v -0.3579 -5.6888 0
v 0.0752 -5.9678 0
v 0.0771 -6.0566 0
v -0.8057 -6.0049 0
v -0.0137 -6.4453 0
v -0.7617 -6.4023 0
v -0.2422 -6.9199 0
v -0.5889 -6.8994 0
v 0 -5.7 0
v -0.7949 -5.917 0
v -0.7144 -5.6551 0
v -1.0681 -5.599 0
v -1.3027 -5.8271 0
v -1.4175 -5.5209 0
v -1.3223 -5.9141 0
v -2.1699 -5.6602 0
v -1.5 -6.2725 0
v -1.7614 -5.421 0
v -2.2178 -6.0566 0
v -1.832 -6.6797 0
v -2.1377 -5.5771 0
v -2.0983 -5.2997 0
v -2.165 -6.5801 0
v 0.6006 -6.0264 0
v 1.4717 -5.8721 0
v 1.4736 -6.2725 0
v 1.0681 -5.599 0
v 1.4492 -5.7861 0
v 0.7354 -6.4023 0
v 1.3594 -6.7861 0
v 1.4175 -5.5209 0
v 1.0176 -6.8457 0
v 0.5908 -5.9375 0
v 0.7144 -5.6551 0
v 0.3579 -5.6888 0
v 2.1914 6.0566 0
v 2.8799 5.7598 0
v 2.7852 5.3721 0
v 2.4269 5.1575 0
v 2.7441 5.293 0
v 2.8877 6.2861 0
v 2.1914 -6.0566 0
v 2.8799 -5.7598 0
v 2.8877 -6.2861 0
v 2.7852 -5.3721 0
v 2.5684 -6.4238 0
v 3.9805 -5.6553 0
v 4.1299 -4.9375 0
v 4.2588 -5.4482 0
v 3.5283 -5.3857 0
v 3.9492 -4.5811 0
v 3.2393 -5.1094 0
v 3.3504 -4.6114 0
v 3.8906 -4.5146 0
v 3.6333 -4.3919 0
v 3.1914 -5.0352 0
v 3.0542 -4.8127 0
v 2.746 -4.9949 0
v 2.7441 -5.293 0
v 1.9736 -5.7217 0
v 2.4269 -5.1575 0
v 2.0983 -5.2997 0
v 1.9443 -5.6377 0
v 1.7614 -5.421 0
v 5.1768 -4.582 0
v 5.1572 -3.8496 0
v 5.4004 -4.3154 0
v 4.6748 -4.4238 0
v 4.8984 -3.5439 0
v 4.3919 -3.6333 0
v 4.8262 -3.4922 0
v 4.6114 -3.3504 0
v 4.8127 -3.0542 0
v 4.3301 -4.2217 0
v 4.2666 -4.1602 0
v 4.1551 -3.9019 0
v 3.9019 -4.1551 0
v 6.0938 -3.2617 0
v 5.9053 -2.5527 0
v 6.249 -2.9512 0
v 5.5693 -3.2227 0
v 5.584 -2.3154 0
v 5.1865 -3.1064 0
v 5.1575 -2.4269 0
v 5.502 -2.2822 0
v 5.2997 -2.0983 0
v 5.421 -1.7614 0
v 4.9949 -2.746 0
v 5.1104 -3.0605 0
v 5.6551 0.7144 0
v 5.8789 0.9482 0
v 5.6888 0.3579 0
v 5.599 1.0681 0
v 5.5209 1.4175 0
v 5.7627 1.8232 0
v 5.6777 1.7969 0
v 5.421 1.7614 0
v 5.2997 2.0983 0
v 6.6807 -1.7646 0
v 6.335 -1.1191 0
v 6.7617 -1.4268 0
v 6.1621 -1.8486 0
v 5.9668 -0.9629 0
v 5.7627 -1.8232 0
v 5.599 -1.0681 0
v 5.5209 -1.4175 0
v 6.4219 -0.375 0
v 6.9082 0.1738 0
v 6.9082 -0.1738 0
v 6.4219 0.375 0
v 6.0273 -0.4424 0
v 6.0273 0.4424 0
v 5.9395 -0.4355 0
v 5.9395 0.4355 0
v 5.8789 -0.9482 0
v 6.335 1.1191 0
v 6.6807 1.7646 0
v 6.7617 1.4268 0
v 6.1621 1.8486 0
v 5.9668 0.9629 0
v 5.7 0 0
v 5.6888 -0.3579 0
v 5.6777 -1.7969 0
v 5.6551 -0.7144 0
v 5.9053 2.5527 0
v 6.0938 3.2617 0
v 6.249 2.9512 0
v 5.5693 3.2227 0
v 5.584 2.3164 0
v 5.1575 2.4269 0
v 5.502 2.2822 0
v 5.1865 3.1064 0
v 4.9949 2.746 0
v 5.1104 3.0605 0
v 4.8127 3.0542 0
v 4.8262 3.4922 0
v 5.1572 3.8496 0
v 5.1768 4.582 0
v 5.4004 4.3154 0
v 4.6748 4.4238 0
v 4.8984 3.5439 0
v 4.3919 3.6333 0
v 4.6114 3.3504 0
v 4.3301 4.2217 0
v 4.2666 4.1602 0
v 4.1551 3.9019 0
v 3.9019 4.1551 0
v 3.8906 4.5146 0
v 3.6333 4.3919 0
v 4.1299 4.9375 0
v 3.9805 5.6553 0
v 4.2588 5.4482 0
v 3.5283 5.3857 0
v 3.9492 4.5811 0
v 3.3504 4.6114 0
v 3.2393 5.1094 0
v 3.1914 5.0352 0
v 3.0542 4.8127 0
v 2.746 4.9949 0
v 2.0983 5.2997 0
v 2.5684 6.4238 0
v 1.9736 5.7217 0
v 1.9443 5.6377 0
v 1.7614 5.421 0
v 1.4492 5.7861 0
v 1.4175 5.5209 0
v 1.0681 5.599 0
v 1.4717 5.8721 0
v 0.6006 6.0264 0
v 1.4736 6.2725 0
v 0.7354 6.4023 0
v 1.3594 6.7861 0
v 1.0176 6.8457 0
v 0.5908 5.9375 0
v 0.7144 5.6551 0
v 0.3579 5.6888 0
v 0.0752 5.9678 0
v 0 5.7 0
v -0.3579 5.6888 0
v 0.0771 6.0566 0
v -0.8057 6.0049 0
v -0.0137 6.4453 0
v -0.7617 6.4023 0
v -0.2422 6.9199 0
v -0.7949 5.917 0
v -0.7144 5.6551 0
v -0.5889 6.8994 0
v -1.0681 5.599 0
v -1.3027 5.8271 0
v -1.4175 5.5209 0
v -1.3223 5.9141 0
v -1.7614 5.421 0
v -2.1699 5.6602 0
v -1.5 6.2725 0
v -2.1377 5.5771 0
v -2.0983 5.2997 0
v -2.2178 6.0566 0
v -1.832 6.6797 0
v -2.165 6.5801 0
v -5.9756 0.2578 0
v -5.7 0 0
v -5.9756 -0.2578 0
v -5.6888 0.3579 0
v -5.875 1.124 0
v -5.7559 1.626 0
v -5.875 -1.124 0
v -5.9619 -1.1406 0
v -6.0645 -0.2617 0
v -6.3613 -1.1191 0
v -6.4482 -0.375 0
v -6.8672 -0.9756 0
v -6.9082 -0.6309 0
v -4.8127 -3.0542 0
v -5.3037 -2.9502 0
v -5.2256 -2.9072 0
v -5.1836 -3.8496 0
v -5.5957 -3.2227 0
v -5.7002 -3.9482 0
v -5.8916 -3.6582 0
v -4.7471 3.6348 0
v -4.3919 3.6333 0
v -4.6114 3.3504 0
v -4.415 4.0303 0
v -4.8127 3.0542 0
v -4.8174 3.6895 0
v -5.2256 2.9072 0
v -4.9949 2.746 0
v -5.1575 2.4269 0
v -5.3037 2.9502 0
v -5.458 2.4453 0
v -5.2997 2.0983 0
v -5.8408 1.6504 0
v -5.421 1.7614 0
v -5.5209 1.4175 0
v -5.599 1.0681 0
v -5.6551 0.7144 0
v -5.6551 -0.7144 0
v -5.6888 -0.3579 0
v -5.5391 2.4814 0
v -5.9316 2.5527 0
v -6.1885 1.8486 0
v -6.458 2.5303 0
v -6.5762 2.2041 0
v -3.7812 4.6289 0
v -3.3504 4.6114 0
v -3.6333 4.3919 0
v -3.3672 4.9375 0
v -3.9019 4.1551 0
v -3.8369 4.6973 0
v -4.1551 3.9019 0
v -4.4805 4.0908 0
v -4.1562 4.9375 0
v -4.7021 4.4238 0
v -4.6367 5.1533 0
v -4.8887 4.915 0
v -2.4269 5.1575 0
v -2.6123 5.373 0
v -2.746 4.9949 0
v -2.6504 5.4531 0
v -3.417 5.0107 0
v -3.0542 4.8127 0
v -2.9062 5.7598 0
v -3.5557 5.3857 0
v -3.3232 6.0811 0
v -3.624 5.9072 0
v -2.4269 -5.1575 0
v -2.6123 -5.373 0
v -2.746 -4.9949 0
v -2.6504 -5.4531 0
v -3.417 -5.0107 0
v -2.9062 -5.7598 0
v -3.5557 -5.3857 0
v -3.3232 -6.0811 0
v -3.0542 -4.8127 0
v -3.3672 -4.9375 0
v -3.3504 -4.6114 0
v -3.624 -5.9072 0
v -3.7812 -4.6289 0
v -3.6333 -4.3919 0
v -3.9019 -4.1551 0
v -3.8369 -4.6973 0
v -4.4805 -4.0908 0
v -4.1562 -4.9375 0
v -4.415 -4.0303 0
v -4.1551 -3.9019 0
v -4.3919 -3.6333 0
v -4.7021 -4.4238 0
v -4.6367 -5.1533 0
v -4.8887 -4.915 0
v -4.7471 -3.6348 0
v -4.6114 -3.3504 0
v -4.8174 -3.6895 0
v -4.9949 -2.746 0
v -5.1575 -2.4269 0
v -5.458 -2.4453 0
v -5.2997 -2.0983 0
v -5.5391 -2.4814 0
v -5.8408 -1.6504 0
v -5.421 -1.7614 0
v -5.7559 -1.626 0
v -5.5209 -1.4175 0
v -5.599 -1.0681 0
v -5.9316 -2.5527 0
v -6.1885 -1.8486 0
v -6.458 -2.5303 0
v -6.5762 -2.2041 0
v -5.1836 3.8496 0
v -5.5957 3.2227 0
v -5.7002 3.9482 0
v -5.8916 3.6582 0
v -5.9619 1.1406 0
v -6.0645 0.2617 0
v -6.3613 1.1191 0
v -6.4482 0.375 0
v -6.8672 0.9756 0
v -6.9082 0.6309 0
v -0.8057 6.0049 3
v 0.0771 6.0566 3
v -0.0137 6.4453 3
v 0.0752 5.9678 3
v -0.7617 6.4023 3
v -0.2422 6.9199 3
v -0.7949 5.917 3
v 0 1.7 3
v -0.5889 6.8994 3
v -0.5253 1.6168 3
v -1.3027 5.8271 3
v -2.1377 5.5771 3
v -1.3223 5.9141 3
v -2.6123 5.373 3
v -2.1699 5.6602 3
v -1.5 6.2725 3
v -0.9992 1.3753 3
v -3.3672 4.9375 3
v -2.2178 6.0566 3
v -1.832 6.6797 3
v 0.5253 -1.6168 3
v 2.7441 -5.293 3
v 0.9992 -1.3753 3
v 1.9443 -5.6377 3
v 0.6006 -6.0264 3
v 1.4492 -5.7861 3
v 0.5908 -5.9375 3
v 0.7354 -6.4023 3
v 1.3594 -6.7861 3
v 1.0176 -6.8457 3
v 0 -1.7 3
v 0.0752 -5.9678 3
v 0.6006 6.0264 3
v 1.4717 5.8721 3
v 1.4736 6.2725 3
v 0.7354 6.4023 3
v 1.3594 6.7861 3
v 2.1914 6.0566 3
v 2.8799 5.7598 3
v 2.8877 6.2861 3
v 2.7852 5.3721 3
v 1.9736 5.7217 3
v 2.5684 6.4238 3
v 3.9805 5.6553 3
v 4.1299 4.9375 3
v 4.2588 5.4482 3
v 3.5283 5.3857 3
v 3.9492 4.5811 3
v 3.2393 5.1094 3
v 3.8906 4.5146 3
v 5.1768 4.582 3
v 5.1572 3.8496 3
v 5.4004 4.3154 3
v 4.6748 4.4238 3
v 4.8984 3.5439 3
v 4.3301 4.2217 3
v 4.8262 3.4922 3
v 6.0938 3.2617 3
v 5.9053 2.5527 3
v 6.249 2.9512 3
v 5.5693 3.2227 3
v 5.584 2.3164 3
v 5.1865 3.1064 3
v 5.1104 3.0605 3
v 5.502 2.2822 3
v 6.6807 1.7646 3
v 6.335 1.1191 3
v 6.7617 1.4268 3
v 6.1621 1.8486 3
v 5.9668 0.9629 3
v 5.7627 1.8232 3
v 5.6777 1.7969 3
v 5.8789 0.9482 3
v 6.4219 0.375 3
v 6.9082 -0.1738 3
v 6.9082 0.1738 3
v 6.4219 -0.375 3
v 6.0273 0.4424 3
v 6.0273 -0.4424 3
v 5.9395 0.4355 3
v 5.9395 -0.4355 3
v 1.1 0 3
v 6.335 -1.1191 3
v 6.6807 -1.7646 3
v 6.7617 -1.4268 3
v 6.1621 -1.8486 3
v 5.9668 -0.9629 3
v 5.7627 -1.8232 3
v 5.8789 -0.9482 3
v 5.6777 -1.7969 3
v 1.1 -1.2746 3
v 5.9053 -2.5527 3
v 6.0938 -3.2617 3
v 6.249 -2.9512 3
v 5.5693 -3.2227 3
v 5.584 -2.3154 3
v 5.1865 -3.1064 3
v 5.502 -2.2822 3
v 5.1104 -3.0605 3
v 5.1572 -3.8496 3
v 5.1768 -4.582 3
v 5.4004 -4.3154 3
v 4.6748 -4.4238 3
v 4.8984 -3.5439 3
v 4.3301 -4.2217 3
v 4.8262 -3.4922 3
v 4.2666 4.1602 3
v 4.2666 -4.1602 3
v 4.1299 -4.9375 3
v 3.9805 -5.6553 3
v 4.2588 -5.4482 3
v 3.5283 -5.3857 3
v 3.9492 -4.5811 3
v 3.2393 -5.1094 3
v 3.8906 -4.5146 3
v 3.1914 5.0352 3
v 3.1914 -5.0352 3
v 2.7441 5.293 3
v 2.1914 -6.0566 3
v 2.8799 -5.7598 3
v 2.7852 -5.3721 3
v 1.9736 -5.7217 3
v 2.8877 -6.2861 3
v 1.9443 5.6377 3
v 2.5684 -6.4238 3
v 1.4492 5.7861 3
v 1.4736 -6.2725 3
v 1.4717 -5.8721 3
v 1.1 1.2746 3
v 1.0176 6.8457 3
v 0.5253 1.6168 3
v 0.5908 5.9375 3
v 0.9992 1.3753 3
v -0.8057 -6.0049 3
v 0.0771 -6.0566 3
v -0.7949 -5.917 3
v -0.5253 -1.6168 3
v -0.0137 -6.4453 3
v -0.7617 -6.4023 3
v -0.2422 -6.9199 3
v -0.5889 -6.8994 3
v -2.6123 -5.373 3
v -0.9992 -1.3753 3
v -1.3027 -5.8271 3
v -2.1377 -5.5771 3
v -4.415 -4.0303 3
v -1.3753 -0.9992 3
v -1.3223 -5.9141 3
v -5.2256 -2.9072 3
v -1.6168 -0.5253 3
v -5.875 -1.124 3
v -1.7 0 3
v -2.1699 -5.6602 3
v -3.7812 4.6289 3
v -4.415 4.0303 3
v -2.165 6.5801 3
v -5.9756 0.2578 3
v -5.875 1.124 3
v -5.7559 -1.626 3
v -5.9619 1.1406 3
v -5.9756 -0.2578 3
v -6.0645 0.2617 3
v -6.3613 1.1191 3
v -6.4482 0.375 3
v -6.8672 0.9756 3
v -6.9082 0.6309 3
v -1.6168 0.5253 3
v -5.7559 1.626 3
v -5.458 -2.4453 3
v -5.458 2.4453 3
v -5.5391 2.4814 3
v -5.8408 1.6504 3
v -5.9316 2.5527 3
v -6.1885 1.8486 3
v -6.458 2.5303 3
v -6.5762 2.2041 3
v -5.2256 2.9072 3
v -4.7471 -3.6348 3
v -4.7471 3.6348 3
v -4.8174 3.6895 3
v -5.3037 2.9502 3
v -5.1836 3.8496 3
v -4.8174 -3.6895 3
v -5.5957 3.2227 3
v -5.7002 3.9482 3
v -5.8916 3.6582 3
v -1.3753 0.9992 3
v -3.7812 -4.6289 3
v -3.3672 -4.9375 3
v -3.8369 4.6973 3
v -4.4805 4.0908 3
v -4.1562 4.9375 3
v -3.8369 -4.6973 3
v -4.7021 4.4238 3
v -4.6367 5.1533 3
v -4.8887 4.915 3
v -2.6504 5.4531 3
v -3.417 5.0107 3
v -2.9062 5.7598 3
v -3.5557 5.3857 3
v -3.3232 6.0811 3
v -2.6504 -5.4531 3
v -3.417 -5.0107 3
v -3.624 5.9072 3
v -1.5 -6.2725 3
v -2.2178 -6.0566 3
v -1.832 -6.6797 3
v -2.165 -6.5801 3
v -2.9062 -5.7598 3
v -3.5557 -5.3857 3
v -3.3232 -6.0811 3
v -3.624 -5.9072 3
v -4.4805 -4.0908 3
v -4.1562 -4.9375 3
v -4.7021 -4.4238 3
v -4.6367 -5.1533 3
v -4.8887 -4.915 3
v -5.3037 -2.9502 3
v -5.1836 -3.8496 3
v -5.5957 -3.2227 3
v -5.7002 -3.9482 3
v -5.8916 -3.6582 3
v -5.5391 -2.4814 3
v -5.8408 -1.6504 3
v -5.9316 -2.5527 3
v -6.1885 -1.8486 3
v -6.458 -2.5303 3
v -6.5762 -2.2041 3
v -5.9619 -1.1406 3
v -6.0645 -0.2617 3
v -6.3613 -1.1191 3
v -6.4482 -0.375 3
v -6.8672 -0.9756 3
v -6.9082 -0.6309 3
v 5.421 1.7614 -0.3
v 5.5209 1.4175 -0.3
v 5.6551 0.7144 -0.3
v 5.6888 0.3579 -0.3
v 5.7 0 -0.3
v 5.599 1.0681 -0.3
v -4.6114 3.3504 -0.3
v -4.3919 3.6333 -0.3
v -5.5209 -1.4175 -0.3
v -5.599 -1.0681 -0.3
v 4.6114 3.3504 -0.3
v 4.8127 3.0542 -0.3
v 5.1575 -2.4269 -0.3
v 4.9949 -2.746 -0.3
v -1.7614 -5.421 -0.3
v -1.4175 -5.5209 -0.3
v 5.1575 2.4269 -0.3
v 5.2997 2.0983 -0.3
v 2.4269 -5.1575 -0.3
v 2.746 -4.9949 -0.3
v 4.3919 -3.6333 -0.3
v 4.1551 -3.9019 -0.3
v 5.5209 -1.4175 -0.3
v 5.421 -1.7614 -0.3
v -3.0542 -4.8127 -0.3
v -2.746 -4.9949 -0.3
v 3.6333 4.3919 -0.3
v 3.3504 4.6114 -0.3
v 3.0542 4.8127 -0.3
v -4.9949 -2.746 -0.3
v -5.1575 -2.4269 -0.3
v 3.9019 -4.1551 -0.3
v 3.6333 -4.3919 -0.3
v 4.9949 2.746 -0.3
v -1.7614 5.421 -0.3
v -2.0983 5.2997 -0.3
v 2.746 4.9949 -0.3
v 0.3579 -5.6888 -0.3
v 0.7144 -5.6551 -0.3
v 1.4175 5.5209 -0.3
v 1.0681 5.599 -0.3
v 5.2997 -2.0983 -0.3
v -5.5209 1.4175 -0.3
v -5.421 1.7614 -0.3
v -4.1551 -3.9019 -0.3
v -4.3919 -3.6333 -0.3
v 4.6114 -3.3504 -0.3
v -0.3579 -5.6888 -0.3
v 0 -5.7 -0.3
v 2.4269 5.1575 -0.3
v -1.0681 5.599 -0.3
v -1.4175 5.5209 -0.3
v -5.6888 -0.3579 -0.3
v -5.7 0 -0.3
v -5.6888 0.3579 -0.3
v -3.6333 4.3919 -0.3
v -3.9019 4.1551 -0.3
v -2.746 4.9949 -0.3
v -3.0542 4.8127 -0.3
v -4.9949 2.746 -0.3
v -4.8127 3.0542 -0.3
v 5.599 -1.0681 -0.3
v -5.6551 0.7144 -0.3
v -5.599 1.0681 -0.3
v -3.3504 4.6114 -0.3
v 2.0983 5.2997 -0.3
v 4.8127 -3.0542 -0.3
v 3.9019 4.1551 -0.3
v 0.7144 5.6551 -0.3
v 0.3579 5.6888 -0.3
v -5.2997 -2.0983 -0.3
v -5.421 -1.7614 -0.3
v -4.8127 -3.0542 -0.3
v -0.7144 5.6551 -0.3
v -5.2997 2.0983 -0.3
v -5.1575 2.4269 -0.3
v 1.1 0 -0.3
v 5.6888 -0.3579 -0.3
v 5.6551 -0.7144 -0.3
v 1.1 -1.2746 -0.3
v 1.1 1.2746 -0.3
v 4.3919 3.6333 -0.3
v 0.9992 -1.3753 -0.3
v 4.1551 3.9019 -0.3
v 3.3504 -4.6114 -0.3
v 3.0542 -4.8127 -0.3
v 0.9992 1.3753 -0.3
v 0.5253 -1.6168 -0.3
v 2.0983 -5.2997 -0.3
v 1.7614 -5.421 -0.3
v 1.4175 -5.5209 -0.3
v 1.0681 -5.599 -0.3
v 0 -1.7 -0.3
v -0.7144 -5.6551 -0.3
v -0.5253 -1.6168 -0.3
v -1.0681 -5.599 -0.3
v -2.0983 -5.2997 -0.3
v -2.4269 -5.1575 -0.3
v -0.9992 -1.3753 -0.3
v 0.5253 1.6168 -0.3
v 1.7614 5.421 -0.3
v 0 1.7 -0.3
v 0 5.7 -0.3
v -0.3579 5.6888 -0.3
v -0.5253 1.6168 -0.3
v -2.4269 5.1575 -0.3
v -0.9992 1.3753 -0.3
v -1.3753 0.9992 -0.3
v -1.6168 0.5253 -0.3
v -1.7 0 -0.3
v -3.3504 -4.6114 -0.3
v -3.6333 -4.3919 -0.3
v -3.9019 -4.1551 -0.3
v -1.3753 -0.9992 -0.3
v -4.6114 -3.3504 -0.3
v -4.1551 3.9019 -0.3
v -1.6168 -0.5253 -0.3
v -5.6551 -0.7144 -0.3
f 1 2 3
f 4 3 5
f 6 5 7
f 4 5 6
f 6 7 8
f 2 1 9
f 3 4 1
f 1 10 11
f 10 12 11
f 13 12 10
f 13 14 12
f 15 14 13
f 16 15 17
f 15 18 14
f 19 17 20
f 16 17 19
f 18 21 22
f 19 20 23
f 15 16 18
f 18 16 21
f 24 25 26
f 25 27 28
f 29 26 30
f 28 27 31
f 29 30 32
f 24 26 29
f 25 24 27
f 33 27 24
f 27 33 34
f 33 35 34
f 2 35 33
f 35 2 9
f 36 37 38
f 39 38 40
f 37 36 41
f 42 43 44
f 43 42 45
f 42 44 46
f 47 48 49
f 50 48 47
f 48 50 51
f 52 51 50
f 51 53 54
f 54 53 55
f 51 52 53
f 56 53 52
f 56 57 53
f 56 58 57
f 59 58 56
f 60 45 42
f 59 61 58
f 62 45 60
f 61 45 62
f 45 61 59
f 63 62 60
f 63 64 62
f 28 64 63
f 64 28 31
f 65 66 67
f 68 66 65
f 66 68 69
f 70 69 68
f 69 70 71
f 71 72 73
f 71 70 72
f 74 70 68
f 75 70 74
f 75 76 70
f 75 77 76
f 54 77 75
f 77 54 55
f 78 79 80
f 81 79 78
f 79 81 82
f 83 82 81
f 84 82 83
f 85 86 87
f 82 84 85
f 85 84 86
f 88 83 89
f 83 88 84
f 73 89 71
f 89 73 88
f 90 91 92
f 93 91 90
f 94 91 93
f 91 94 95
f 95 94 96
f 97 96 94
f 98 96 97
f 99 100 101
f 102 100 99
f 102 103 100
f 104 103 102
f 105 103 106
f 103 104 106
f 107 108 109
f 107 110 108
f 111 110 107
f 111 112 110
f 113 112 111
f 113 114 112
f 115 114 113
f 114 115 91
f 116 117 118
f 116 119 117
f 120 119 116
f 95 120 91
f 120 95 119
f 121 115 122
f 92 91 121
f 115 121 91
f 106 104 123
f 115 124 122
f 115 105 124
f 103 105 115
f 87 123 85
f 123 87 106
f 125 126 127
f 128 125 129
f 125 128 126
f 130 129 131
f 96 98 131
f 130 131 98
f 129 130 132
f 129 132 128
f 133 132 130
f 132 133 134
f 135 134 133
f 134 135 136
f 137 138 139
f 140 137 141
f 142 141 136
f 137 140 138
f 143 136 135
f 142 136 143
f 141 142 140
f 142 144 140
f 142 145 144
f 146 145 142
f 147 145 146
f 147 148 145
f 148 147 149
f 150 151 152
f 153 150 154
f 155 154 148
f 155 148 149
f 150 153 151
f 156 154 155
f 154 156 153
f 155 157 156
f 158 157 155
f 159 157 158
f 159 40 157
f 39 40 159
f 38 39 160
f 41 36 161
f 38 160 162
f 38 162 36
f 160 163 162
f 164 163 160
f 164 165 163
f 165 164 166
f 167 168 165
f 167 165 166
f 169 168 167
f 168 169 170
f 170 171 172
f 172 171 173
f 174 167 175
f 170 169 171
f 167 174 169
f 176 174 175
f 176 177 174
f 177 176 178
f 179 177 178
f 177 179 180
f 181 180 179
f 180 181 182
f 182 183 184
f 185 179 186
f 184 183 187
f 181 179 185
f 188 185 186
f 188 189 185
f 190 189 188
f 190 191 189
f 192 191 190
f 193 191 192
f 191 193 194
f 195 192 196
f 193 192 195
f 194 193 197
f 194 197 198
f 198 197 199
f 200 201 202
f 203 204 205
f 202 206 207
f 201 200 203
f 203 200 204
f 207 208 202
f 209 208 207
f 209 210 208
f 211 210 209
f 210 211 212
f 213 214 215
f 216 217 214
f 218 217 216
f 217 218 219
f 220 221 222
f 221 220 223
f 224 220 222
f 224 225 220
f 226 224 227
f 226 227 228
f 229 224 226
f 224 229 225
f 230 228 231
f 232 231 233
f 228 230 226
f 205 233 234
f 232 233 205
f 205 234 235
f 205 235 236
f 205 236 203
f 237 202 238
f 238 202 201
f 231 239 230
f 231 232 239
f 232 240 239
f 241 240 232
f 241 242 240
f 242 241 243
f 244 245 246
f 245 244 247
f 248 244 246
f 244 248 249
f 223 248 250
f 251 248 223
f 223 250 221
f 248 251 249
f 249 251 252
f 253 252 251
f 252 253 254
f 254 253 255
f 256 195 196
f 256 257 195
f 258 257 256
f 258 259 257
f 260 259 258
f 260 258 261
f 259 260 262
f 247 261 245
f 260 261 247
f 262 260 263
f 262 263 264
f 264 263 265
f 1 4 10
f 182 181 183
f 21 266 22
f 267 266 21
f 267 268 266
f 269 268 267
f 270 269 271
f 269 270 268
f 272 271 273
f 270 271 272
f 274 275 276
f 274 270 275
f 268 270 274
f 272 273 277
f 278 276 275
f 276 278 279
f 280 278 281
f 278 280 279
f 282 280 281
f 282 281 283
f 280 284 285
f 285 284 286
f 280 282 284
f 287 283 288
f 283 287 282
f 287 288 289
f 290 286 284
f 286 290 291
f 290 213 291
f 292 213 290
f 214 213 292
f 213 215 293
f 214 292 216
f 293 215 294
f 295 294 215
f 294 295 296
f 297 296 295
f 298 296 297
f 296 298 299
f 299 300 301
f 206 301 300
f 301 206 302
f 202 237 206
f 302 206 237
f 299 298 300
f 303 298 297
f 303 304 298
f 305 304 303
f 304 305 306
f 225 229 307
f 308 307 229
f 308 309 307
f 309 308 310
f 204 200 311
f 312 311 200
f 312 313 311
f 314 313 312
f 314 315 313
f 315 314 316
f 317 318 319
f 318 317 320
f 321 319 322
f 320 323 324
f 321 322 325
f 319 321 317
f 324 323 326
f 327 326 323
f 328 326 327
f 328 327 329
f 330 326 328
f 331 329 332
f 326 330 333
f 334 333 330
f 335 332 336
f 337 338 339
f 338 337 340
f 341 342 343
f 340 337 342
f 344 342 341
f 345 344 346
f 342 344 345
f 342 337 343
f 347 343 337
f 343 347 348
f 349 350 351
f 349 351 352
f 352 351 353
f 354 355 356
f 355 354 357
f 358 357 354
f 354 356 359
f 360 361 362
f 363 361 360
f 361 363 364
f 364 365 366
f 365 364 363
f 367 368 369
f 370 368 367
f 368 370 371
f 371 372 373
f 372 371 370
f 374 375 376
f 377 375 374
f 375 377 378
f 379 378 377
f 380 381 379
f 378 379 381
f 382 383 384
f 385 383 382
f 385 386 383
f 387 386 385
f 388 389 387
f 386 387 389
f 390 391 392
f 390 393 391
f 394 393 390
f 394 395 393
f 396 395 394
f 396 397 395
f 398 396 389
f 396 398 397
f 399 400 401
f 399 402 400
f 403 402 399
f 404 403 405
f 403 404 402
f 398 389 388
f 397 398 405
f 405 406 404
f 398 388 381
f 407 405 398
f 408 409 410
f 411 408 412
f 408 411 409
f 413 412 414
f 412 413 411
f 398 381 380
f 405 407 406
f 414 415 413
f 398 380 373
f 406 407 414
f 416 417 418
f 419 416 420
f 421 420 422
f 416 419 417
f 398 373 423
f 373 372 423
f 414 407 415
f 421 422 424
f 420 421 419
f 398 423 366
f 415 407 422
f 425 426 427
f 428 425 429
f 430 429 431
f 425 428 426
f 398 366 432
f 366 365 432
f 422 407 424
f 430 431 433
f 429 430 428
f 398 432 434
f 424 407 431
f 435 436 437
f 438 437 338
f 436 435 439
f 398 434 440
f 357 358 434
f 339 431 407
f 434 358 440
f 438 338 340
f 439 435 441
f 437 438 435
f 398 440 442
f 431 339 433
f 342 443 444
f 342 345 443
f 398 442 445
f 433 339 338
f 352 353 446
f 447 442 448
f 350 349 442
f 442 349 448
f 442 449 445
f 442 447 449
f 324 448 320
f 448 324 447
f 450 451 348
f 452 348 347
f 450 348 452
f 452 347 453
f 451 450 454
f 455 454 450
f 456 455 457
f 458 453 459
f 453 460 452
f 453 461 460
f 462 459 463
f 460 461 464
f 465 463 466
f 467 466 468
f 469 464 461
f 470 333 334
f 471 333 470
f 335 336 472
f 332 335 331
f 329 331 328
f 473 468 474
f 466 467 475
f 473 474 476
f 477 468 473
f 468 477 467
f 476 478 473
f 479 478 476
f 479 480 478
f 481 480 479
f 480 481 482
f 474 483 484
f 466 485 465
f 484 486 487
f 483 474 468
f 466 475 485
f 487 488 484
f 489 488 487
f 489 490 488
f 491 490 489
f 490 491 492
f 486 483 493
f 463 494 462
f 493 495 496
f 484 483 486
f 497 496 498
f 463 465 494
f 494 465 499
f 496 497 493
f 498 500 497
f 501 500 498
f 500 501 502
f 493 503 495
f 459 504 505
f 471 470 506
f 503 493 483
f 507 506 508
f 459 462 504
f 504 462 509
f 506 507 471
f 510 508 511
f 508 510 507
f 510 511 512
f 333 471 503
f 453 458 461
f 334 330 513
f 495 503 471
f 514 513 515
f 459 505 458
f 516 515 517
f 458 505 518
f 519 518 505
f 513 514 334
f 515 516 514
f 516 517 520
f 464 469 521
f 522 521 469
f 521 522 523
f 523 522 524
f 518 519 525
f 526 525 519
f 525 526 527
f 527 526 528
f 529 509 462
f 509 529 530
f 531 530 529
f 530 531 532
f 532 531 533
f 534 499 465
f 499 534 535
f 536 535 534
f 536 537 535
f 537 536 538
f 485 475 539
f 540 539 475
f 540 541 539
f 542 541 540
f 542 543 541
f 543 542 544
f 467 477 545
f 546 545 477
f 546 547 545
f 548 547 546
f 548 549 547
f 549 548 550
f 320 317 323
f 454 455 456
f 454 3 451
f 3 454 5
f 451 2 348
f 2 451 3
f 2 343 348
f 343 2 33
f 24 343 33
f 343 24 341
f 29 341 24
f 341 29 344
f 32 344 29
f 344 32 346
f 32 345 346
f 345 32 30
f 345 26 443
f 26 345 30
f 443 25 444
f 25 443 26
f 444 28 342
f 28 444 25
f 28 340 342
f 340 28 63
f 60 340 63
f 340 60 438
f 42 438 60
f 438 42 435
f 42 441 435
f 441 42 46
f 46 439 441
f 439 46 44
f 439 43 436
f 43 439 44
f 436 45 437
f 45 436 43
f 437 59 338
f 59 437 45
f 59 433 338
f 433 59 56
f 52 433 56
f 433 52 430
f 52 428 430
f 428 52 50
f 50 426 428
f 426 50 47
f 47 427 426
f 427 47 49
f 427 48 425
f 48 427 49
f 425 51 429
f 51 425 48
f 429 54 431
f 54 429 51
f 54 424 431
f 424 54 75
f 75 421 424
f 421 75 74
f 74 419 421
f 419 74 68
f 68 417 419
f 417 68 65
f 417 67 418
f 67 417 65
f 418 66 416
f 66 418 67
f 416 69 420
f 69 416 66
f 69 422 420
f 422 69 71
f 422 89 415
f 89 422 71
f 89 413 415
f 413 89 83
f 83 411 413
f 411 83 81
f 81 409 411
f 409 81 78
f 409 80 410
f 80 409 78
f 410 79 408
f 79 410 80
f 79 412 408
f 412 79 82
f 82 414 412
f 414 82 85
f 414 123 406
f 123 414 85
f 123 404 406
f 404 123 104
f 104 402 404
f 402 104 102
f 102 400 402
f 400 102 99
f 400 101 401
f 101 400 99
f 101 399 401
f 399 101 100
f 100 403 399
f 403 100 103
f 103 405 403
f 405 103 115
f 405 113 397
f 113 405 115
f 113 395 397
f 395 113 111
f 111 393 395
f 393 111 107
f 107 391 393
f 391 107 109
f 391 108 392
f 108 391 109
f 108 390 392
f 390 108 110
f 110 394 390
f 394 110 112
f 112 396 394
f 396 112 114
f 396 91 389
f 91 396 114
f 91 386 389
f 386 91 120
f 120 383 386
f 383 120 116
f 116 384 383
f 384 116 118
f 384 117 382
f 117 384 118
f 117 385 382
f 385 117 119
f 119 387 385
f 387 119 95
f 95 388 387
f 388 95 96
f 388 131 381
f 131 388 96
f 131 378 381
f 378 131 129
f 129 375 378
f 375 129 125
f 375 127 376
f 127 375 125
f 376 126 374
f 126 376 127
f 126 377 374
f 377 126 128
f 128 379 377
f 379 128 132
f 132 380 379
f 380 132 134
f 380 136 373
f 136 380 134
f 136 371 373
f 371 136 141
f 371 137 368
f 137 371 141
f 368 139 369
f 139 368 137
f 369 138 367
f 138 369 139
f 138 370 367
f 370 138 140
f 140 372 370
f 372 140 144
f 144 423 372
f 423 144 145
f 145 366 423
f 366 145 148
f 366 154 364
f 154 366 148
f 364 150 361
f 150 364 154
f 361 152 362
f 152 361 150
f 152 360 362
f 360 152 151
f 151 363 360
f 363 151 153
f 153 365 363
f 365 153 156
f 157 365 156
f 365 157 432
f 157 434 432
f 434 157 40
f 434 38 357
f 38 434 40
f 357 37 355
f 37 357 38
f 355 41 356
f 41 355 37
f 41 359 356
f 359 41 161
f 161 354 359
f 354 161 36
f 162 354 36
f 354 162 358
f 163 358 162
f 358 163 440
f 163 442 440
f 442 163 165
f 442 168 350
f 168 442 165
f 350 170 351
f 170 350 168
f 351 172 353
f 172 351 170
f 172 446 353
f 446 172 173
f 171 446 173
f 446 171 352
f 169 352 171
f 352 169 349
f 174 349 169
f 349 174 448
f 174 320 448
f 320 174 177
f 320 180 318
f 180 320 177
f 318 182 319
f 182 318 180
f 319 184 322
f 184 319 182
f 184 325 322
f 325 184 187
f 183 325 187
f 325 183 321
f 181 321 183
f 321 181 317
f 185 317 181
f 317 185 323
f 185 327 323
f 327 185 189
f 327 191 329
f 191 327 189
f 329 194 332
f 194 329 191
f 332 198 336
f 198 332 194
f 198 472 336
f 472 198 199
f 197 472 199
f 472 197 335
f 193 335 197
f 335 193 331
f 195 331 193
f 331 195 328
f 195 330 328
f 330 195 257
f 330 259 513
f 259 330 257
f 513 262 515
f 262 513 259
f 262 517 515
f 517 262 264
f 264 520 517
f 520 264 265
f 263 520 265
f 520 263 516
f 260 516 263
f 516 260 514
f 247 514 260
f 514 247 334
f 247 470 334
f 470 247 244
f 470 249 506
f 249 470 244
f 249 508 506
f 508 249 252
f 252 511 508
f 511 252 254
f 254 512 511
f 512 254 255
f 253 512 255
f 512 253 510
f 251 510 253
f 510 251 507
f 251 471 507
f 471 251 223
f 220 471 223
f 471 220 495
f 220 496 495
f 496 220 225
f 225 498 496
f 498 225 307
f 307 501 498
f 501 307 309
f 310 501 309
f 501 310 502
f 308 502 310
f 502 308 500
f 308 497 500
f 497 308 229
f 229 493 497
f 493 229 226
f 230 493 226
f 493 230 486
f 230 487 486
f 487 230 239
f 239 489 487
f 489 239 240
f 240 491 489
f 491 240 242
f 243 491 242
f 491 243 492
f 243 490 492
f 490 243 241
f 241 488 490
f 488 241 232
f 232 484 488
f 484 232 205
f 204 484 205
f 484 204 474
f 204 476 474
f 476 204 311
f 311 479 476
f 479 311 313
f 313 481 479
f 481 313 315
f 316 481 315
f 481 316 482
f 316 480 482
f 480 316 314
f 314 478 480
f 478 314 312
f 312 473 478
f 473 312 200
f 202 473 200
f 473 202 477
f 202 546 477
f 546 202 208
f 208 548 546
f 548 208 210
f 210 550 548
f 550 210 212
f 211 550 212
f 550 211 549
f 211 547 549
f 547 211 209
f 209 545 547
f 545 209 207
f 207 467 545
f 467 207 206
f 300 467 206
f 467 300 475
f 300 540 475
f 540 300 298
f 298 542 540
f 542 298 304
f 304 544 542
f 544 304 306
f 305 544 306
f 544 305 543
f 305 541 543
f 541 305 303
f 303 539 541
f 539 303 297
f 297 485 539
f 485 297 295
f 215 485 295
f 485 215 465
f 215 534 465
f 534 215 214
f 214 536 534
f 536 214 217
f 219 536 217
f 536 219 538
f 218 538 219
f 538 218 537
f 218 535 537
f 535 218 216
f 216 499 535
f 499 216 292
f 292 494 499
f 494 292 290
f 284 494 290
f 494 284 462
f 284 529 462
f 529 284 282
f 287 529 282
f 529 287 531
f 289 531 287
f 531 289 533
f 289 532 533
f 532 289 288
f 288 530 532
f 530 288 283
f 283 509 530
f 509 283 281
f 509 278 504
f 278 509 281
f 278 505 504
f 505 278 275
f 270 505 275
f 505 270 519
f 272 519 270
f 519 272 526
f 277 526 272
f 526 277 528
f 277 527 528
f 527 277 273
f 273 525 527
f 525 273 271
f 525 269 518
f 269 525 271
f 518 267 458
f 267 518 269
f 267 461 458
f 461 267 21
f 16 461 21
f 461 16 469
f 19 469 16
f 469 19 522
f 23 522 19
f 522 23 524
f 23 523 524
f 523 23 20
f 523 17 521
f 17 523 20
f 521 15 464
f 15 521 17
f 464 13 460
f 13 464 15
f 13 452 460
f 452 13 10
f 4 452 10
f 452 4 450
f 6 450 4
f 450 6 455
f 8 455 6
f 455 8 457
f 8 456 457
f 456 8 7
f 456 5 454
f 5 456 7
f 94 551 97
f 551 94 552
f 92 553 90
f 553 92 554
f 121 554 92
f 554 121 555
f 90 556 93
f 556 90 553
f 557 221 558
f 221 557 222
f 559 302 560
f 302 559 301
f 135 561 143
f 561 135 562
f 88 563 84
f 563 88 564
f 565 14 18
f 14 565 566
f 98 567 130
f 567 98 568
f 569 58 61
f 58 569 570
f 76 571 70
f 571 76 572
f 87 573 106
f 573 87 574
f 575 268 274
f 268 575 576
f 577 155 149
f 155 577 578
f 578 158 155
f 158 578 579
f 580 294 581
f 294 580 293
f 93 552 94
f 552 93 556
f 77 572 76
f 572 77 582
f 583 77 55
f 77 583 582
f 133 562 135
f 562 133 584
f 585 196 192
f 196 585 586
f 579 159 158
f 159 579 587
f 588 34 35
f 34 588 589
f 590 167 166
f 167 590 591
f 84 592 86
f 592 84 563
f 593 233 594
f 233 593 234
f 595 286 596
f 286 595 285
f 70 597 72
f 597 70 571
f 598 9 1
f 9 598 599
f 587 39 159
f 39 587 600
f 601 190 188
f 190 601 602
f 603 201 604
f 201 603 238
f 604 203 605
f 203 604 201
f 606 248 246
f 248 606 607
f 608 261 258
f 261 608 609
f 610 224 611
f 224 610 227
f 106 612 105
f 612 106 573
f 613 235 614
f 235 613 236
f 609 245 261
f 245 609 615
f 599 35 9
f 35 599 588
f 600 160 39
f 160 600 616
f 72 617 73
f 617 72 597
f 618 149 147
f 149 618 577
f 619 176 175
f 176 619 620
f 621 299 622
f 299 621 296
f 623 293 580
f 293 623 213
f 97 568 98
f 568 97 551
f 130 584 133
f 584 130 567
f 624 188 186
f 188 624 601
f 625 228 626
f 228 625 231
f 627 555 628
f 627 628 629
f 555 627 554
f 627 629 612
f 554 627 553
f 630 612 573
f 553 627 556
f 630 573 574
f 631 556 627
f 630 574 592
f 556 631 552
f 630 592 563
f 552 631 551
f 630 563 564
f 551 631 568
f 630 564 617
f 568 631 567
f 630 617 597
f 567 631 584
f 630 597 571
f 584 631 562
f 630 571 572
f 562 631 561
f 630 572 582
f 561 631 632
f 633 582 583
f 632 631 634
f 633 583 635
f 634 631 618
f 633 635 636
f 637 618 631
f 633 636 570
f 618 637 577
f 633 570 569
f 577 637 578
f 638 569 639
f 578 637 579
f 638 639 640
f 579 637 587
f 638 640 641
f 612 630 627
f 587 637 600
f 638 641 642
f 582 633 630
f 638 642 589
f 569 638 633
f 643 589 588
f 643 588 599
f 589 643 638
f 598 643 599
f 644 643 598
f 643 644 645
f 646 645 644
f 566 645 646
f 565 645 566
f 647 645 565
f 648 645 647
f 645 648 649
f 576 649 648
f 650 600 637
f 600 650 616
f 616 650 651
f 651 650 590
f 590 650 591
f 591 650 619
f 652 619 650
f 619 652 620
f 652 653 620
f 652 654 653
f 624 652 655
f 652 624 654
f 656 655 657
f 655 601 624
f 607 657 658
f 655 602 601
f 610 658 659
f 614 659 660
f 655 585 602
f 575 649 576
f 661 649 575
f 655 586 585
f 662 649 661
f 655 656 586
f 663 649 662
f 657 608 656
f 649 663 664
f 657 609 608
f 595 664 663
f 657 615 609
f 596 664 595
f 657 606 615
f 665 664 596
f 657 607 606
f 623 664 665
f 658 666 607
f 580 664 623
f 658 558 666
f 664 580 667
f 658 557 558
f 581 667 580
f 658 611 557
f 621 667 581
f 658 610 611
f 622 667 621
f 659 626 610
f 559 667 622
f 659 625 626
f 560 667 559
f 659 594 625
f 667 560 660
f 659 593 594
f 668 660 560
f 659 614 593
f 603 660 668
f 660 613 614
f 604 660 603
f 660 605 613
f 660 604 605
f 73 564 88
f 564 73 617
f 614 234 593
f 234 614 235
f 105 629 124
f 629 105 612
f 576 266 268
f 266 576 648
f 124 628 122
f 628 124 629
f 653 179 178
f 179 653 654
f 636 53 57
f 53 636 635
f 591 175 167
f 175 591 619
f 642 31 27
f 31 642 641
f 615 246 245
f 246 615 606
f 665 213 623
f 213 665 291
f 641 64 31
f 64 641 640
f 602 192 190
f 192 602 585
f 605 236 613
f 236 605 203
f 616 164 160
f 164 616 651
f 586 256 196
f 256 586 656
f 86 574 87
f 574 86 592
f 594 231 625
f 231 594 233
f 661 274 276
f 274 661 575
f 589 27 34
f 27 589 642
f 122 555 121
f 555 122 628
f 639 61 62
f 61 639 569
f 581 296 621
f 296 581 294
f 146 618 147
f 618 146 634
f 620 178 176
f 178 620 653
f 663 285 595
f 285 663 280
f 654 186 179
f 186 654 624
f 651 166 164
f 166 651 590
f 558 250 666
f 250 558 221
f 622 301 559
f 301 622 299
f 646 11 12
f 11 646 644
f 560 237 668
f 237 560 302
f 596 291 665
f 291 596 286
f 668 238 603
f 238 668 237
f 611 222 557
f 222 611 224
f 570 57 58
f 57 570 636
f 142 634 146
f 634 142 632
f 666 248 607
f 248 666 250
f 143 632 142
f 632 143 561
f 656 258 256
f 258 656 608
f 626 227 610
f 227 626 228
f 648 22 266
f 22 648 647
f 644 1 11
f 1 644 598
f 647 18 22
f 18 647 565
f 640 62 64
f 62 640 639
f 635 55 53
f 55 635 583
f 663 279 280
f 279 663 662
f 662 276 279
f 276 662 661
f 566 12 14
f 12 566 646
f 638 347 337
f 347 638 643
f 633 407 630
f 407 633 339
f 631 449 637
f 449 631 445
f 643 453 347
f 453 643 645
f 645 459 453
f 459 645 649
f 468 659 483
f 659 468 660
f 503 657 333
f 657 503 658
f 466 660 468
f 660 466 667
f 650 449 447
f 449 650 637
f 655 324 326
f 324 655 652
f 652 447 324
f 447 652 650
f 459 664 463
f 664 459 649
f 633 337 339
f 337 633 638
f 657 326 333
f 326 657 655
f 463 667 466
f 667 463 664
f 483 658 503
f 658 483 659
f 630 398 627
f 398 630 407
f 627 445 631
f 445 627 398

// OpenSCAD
3dp_error = 0.2;
//3dp_error = 0.3;
//3dp_error = 0.4;

// Печатать с макс скоростью (по крайней мере мелкие t8 и t9),
// 100% заполнение, 
// тонкая настройка качества печати: обрамление детали=Нет

// gears1:
// t27: dmotor2, d3, d2.8, d2.6
// t8-d2.4 - не ОК
// t9-d2.6 - не ОК
//
//gears2:
// t8-d2.2 - ОК, но не влезает на вал
// t9-d2.4, d2.2
// t27-motor2-e0.3, e0.4: ch1.2, 
// t27-motor2-e0.4: ch1.1
//
// gears3
// t63-d2.2-h0.2, t63-d2.4-h0.4
// 
// gears4
// t63-d2.2-h0.5-supg
// t63-motor2-e0.3-ch1-h0.5
// t27-motor2-e0.3-ch1-h0.5
// t8-d2.2 - ОК, но не влезает на вал
// t9-d2.4 - ОК и налезает (и крутится)
// t9-d2.2 - не ОК (расползается после печати)
// волшебным образом (при генерации слайсером) t9-d2.4 печатается
// нормально, т.к. принтер отрисовывает внутреннее кольцо, а t9-d2.2
// сразу расползается на отдельные зубья (хотя диаметр кольца меньше и 
// по логике дожно быть наоборот)
//
// gears5 (Builder)
// t9-d2.2 - развалились (нужно было t9-d2.4!)
// gears-cp1.5-t27-d2.2-h0.3
// gears-cp1.5-t27-motor2-e0.2-ch1-h0.3
// gears-cp1.5-t43-d2.2-h0.3

// gears5
// t9-d2.4 9шт

difference() {
  union() {
    // шестеренка
    //linear_extrude(height=3) import(file="gear-cp1.5-t8.dxf");
    //linear_extrude(height=3) import(file="gear-cp1.5-t9.dxf");
    linear_extrude(height=3) import(file="gear-cp1.5-t27.dxf");
    //linear_extrude(height=3) import(file="gear-cp1.5-t43.dxf");
    //linear_extrude(height=3) import(file="gear-cp1.5-t63.dxf");

    // подсадка, чтобы не расплывались зубья
    // для 27
    translate([0, 0, -0.3]) cylinder(h=1, r=5.7, $fn=100);

    // для 43
    //translate([0, 0, -0.3]) cylinder(h=1, r=9.6, $fn=100);
   
    // для 63
    //translate([0, 0, -0.3]) cylinder(h=1, r=14, $fn=100);
    //translate([0, 0, -0.5]) 
    //  linear_extrude(height=1) import(file="gear-cp1.5-t63-support.dxf");
  
    // второй уровень
    //translate([0, 0, 2]) 
    //  linear_extrude(height=4) import(file="gear-cp1.5-t27.dxf");
  }
   
  // t8-d2.0 - ОК
  // t8-d2.4 - не ОК
  // t9-d2.6 - не ОК

  // ось
  //generic_axis(radius=1+3dp_error); // diam=3  
  //motor2_axis(radius=1.5+3dp_error, cut_h=1.2+3dp_error);
  //motor2_axis(radius=1.5+3dp_error, cut_h=1.1+3dp_error);
  //motor2_axis(radius=1.5+3dp_error, cut_h=1+3dp_error);
  motor2_axis(radius=1.5+3dp_error, cut_h=0.9+3dp_error);

  //generic_axis(radius=1.5); // diam=3
  //generic_axis(radius=1.4); // diam=2.8
  //generic_axis(radius=1.3); // diam=2.6
  //generic_axis(radius=1.2); // diam=2.4
  generic_axis(radius=1.1); // diam=2.2
  //motor2_axis();
}


/**
 * Просто круглая ось, по умолчанию диаметр 3мм.
 */
module generic_axis(length=22, radius=1.5) {
  translate([0,0,-1])
    cylinder(h=length, r=radius, $fn=20);
}


/** 
 * Ось для для мотора 2:
 * Pololu 4.5V, 80rpm Right Angle (прямой, желтый)
 * www.robotshop.com/en/solarbotics-gm7-gear-motor-7.html
 *
 * Диаметр оси мотора 3мм, расстояние от центра до среза 
 * с одного бока cut=0.9мм.
 */
module motor2_axis(length=22, radius=1.5, cut_radius=0.9) {
  // диаметр 3мм, срез с одного бока 0.3мм
  translate([0,0,-1])
  difference() {
    cylinder(h=length, r=radius, $fn=20);
    // 1.5 мм "вниз" по y (совместить куб с цилиндром), 
    // 1.1 "вправо" по x (срезать справа, для cut=0.3мм: 1.5-0.3=1.2)
    translate([cut_h, -1.5, 0]) 
      cube([2, 3, length]);
  }
}
